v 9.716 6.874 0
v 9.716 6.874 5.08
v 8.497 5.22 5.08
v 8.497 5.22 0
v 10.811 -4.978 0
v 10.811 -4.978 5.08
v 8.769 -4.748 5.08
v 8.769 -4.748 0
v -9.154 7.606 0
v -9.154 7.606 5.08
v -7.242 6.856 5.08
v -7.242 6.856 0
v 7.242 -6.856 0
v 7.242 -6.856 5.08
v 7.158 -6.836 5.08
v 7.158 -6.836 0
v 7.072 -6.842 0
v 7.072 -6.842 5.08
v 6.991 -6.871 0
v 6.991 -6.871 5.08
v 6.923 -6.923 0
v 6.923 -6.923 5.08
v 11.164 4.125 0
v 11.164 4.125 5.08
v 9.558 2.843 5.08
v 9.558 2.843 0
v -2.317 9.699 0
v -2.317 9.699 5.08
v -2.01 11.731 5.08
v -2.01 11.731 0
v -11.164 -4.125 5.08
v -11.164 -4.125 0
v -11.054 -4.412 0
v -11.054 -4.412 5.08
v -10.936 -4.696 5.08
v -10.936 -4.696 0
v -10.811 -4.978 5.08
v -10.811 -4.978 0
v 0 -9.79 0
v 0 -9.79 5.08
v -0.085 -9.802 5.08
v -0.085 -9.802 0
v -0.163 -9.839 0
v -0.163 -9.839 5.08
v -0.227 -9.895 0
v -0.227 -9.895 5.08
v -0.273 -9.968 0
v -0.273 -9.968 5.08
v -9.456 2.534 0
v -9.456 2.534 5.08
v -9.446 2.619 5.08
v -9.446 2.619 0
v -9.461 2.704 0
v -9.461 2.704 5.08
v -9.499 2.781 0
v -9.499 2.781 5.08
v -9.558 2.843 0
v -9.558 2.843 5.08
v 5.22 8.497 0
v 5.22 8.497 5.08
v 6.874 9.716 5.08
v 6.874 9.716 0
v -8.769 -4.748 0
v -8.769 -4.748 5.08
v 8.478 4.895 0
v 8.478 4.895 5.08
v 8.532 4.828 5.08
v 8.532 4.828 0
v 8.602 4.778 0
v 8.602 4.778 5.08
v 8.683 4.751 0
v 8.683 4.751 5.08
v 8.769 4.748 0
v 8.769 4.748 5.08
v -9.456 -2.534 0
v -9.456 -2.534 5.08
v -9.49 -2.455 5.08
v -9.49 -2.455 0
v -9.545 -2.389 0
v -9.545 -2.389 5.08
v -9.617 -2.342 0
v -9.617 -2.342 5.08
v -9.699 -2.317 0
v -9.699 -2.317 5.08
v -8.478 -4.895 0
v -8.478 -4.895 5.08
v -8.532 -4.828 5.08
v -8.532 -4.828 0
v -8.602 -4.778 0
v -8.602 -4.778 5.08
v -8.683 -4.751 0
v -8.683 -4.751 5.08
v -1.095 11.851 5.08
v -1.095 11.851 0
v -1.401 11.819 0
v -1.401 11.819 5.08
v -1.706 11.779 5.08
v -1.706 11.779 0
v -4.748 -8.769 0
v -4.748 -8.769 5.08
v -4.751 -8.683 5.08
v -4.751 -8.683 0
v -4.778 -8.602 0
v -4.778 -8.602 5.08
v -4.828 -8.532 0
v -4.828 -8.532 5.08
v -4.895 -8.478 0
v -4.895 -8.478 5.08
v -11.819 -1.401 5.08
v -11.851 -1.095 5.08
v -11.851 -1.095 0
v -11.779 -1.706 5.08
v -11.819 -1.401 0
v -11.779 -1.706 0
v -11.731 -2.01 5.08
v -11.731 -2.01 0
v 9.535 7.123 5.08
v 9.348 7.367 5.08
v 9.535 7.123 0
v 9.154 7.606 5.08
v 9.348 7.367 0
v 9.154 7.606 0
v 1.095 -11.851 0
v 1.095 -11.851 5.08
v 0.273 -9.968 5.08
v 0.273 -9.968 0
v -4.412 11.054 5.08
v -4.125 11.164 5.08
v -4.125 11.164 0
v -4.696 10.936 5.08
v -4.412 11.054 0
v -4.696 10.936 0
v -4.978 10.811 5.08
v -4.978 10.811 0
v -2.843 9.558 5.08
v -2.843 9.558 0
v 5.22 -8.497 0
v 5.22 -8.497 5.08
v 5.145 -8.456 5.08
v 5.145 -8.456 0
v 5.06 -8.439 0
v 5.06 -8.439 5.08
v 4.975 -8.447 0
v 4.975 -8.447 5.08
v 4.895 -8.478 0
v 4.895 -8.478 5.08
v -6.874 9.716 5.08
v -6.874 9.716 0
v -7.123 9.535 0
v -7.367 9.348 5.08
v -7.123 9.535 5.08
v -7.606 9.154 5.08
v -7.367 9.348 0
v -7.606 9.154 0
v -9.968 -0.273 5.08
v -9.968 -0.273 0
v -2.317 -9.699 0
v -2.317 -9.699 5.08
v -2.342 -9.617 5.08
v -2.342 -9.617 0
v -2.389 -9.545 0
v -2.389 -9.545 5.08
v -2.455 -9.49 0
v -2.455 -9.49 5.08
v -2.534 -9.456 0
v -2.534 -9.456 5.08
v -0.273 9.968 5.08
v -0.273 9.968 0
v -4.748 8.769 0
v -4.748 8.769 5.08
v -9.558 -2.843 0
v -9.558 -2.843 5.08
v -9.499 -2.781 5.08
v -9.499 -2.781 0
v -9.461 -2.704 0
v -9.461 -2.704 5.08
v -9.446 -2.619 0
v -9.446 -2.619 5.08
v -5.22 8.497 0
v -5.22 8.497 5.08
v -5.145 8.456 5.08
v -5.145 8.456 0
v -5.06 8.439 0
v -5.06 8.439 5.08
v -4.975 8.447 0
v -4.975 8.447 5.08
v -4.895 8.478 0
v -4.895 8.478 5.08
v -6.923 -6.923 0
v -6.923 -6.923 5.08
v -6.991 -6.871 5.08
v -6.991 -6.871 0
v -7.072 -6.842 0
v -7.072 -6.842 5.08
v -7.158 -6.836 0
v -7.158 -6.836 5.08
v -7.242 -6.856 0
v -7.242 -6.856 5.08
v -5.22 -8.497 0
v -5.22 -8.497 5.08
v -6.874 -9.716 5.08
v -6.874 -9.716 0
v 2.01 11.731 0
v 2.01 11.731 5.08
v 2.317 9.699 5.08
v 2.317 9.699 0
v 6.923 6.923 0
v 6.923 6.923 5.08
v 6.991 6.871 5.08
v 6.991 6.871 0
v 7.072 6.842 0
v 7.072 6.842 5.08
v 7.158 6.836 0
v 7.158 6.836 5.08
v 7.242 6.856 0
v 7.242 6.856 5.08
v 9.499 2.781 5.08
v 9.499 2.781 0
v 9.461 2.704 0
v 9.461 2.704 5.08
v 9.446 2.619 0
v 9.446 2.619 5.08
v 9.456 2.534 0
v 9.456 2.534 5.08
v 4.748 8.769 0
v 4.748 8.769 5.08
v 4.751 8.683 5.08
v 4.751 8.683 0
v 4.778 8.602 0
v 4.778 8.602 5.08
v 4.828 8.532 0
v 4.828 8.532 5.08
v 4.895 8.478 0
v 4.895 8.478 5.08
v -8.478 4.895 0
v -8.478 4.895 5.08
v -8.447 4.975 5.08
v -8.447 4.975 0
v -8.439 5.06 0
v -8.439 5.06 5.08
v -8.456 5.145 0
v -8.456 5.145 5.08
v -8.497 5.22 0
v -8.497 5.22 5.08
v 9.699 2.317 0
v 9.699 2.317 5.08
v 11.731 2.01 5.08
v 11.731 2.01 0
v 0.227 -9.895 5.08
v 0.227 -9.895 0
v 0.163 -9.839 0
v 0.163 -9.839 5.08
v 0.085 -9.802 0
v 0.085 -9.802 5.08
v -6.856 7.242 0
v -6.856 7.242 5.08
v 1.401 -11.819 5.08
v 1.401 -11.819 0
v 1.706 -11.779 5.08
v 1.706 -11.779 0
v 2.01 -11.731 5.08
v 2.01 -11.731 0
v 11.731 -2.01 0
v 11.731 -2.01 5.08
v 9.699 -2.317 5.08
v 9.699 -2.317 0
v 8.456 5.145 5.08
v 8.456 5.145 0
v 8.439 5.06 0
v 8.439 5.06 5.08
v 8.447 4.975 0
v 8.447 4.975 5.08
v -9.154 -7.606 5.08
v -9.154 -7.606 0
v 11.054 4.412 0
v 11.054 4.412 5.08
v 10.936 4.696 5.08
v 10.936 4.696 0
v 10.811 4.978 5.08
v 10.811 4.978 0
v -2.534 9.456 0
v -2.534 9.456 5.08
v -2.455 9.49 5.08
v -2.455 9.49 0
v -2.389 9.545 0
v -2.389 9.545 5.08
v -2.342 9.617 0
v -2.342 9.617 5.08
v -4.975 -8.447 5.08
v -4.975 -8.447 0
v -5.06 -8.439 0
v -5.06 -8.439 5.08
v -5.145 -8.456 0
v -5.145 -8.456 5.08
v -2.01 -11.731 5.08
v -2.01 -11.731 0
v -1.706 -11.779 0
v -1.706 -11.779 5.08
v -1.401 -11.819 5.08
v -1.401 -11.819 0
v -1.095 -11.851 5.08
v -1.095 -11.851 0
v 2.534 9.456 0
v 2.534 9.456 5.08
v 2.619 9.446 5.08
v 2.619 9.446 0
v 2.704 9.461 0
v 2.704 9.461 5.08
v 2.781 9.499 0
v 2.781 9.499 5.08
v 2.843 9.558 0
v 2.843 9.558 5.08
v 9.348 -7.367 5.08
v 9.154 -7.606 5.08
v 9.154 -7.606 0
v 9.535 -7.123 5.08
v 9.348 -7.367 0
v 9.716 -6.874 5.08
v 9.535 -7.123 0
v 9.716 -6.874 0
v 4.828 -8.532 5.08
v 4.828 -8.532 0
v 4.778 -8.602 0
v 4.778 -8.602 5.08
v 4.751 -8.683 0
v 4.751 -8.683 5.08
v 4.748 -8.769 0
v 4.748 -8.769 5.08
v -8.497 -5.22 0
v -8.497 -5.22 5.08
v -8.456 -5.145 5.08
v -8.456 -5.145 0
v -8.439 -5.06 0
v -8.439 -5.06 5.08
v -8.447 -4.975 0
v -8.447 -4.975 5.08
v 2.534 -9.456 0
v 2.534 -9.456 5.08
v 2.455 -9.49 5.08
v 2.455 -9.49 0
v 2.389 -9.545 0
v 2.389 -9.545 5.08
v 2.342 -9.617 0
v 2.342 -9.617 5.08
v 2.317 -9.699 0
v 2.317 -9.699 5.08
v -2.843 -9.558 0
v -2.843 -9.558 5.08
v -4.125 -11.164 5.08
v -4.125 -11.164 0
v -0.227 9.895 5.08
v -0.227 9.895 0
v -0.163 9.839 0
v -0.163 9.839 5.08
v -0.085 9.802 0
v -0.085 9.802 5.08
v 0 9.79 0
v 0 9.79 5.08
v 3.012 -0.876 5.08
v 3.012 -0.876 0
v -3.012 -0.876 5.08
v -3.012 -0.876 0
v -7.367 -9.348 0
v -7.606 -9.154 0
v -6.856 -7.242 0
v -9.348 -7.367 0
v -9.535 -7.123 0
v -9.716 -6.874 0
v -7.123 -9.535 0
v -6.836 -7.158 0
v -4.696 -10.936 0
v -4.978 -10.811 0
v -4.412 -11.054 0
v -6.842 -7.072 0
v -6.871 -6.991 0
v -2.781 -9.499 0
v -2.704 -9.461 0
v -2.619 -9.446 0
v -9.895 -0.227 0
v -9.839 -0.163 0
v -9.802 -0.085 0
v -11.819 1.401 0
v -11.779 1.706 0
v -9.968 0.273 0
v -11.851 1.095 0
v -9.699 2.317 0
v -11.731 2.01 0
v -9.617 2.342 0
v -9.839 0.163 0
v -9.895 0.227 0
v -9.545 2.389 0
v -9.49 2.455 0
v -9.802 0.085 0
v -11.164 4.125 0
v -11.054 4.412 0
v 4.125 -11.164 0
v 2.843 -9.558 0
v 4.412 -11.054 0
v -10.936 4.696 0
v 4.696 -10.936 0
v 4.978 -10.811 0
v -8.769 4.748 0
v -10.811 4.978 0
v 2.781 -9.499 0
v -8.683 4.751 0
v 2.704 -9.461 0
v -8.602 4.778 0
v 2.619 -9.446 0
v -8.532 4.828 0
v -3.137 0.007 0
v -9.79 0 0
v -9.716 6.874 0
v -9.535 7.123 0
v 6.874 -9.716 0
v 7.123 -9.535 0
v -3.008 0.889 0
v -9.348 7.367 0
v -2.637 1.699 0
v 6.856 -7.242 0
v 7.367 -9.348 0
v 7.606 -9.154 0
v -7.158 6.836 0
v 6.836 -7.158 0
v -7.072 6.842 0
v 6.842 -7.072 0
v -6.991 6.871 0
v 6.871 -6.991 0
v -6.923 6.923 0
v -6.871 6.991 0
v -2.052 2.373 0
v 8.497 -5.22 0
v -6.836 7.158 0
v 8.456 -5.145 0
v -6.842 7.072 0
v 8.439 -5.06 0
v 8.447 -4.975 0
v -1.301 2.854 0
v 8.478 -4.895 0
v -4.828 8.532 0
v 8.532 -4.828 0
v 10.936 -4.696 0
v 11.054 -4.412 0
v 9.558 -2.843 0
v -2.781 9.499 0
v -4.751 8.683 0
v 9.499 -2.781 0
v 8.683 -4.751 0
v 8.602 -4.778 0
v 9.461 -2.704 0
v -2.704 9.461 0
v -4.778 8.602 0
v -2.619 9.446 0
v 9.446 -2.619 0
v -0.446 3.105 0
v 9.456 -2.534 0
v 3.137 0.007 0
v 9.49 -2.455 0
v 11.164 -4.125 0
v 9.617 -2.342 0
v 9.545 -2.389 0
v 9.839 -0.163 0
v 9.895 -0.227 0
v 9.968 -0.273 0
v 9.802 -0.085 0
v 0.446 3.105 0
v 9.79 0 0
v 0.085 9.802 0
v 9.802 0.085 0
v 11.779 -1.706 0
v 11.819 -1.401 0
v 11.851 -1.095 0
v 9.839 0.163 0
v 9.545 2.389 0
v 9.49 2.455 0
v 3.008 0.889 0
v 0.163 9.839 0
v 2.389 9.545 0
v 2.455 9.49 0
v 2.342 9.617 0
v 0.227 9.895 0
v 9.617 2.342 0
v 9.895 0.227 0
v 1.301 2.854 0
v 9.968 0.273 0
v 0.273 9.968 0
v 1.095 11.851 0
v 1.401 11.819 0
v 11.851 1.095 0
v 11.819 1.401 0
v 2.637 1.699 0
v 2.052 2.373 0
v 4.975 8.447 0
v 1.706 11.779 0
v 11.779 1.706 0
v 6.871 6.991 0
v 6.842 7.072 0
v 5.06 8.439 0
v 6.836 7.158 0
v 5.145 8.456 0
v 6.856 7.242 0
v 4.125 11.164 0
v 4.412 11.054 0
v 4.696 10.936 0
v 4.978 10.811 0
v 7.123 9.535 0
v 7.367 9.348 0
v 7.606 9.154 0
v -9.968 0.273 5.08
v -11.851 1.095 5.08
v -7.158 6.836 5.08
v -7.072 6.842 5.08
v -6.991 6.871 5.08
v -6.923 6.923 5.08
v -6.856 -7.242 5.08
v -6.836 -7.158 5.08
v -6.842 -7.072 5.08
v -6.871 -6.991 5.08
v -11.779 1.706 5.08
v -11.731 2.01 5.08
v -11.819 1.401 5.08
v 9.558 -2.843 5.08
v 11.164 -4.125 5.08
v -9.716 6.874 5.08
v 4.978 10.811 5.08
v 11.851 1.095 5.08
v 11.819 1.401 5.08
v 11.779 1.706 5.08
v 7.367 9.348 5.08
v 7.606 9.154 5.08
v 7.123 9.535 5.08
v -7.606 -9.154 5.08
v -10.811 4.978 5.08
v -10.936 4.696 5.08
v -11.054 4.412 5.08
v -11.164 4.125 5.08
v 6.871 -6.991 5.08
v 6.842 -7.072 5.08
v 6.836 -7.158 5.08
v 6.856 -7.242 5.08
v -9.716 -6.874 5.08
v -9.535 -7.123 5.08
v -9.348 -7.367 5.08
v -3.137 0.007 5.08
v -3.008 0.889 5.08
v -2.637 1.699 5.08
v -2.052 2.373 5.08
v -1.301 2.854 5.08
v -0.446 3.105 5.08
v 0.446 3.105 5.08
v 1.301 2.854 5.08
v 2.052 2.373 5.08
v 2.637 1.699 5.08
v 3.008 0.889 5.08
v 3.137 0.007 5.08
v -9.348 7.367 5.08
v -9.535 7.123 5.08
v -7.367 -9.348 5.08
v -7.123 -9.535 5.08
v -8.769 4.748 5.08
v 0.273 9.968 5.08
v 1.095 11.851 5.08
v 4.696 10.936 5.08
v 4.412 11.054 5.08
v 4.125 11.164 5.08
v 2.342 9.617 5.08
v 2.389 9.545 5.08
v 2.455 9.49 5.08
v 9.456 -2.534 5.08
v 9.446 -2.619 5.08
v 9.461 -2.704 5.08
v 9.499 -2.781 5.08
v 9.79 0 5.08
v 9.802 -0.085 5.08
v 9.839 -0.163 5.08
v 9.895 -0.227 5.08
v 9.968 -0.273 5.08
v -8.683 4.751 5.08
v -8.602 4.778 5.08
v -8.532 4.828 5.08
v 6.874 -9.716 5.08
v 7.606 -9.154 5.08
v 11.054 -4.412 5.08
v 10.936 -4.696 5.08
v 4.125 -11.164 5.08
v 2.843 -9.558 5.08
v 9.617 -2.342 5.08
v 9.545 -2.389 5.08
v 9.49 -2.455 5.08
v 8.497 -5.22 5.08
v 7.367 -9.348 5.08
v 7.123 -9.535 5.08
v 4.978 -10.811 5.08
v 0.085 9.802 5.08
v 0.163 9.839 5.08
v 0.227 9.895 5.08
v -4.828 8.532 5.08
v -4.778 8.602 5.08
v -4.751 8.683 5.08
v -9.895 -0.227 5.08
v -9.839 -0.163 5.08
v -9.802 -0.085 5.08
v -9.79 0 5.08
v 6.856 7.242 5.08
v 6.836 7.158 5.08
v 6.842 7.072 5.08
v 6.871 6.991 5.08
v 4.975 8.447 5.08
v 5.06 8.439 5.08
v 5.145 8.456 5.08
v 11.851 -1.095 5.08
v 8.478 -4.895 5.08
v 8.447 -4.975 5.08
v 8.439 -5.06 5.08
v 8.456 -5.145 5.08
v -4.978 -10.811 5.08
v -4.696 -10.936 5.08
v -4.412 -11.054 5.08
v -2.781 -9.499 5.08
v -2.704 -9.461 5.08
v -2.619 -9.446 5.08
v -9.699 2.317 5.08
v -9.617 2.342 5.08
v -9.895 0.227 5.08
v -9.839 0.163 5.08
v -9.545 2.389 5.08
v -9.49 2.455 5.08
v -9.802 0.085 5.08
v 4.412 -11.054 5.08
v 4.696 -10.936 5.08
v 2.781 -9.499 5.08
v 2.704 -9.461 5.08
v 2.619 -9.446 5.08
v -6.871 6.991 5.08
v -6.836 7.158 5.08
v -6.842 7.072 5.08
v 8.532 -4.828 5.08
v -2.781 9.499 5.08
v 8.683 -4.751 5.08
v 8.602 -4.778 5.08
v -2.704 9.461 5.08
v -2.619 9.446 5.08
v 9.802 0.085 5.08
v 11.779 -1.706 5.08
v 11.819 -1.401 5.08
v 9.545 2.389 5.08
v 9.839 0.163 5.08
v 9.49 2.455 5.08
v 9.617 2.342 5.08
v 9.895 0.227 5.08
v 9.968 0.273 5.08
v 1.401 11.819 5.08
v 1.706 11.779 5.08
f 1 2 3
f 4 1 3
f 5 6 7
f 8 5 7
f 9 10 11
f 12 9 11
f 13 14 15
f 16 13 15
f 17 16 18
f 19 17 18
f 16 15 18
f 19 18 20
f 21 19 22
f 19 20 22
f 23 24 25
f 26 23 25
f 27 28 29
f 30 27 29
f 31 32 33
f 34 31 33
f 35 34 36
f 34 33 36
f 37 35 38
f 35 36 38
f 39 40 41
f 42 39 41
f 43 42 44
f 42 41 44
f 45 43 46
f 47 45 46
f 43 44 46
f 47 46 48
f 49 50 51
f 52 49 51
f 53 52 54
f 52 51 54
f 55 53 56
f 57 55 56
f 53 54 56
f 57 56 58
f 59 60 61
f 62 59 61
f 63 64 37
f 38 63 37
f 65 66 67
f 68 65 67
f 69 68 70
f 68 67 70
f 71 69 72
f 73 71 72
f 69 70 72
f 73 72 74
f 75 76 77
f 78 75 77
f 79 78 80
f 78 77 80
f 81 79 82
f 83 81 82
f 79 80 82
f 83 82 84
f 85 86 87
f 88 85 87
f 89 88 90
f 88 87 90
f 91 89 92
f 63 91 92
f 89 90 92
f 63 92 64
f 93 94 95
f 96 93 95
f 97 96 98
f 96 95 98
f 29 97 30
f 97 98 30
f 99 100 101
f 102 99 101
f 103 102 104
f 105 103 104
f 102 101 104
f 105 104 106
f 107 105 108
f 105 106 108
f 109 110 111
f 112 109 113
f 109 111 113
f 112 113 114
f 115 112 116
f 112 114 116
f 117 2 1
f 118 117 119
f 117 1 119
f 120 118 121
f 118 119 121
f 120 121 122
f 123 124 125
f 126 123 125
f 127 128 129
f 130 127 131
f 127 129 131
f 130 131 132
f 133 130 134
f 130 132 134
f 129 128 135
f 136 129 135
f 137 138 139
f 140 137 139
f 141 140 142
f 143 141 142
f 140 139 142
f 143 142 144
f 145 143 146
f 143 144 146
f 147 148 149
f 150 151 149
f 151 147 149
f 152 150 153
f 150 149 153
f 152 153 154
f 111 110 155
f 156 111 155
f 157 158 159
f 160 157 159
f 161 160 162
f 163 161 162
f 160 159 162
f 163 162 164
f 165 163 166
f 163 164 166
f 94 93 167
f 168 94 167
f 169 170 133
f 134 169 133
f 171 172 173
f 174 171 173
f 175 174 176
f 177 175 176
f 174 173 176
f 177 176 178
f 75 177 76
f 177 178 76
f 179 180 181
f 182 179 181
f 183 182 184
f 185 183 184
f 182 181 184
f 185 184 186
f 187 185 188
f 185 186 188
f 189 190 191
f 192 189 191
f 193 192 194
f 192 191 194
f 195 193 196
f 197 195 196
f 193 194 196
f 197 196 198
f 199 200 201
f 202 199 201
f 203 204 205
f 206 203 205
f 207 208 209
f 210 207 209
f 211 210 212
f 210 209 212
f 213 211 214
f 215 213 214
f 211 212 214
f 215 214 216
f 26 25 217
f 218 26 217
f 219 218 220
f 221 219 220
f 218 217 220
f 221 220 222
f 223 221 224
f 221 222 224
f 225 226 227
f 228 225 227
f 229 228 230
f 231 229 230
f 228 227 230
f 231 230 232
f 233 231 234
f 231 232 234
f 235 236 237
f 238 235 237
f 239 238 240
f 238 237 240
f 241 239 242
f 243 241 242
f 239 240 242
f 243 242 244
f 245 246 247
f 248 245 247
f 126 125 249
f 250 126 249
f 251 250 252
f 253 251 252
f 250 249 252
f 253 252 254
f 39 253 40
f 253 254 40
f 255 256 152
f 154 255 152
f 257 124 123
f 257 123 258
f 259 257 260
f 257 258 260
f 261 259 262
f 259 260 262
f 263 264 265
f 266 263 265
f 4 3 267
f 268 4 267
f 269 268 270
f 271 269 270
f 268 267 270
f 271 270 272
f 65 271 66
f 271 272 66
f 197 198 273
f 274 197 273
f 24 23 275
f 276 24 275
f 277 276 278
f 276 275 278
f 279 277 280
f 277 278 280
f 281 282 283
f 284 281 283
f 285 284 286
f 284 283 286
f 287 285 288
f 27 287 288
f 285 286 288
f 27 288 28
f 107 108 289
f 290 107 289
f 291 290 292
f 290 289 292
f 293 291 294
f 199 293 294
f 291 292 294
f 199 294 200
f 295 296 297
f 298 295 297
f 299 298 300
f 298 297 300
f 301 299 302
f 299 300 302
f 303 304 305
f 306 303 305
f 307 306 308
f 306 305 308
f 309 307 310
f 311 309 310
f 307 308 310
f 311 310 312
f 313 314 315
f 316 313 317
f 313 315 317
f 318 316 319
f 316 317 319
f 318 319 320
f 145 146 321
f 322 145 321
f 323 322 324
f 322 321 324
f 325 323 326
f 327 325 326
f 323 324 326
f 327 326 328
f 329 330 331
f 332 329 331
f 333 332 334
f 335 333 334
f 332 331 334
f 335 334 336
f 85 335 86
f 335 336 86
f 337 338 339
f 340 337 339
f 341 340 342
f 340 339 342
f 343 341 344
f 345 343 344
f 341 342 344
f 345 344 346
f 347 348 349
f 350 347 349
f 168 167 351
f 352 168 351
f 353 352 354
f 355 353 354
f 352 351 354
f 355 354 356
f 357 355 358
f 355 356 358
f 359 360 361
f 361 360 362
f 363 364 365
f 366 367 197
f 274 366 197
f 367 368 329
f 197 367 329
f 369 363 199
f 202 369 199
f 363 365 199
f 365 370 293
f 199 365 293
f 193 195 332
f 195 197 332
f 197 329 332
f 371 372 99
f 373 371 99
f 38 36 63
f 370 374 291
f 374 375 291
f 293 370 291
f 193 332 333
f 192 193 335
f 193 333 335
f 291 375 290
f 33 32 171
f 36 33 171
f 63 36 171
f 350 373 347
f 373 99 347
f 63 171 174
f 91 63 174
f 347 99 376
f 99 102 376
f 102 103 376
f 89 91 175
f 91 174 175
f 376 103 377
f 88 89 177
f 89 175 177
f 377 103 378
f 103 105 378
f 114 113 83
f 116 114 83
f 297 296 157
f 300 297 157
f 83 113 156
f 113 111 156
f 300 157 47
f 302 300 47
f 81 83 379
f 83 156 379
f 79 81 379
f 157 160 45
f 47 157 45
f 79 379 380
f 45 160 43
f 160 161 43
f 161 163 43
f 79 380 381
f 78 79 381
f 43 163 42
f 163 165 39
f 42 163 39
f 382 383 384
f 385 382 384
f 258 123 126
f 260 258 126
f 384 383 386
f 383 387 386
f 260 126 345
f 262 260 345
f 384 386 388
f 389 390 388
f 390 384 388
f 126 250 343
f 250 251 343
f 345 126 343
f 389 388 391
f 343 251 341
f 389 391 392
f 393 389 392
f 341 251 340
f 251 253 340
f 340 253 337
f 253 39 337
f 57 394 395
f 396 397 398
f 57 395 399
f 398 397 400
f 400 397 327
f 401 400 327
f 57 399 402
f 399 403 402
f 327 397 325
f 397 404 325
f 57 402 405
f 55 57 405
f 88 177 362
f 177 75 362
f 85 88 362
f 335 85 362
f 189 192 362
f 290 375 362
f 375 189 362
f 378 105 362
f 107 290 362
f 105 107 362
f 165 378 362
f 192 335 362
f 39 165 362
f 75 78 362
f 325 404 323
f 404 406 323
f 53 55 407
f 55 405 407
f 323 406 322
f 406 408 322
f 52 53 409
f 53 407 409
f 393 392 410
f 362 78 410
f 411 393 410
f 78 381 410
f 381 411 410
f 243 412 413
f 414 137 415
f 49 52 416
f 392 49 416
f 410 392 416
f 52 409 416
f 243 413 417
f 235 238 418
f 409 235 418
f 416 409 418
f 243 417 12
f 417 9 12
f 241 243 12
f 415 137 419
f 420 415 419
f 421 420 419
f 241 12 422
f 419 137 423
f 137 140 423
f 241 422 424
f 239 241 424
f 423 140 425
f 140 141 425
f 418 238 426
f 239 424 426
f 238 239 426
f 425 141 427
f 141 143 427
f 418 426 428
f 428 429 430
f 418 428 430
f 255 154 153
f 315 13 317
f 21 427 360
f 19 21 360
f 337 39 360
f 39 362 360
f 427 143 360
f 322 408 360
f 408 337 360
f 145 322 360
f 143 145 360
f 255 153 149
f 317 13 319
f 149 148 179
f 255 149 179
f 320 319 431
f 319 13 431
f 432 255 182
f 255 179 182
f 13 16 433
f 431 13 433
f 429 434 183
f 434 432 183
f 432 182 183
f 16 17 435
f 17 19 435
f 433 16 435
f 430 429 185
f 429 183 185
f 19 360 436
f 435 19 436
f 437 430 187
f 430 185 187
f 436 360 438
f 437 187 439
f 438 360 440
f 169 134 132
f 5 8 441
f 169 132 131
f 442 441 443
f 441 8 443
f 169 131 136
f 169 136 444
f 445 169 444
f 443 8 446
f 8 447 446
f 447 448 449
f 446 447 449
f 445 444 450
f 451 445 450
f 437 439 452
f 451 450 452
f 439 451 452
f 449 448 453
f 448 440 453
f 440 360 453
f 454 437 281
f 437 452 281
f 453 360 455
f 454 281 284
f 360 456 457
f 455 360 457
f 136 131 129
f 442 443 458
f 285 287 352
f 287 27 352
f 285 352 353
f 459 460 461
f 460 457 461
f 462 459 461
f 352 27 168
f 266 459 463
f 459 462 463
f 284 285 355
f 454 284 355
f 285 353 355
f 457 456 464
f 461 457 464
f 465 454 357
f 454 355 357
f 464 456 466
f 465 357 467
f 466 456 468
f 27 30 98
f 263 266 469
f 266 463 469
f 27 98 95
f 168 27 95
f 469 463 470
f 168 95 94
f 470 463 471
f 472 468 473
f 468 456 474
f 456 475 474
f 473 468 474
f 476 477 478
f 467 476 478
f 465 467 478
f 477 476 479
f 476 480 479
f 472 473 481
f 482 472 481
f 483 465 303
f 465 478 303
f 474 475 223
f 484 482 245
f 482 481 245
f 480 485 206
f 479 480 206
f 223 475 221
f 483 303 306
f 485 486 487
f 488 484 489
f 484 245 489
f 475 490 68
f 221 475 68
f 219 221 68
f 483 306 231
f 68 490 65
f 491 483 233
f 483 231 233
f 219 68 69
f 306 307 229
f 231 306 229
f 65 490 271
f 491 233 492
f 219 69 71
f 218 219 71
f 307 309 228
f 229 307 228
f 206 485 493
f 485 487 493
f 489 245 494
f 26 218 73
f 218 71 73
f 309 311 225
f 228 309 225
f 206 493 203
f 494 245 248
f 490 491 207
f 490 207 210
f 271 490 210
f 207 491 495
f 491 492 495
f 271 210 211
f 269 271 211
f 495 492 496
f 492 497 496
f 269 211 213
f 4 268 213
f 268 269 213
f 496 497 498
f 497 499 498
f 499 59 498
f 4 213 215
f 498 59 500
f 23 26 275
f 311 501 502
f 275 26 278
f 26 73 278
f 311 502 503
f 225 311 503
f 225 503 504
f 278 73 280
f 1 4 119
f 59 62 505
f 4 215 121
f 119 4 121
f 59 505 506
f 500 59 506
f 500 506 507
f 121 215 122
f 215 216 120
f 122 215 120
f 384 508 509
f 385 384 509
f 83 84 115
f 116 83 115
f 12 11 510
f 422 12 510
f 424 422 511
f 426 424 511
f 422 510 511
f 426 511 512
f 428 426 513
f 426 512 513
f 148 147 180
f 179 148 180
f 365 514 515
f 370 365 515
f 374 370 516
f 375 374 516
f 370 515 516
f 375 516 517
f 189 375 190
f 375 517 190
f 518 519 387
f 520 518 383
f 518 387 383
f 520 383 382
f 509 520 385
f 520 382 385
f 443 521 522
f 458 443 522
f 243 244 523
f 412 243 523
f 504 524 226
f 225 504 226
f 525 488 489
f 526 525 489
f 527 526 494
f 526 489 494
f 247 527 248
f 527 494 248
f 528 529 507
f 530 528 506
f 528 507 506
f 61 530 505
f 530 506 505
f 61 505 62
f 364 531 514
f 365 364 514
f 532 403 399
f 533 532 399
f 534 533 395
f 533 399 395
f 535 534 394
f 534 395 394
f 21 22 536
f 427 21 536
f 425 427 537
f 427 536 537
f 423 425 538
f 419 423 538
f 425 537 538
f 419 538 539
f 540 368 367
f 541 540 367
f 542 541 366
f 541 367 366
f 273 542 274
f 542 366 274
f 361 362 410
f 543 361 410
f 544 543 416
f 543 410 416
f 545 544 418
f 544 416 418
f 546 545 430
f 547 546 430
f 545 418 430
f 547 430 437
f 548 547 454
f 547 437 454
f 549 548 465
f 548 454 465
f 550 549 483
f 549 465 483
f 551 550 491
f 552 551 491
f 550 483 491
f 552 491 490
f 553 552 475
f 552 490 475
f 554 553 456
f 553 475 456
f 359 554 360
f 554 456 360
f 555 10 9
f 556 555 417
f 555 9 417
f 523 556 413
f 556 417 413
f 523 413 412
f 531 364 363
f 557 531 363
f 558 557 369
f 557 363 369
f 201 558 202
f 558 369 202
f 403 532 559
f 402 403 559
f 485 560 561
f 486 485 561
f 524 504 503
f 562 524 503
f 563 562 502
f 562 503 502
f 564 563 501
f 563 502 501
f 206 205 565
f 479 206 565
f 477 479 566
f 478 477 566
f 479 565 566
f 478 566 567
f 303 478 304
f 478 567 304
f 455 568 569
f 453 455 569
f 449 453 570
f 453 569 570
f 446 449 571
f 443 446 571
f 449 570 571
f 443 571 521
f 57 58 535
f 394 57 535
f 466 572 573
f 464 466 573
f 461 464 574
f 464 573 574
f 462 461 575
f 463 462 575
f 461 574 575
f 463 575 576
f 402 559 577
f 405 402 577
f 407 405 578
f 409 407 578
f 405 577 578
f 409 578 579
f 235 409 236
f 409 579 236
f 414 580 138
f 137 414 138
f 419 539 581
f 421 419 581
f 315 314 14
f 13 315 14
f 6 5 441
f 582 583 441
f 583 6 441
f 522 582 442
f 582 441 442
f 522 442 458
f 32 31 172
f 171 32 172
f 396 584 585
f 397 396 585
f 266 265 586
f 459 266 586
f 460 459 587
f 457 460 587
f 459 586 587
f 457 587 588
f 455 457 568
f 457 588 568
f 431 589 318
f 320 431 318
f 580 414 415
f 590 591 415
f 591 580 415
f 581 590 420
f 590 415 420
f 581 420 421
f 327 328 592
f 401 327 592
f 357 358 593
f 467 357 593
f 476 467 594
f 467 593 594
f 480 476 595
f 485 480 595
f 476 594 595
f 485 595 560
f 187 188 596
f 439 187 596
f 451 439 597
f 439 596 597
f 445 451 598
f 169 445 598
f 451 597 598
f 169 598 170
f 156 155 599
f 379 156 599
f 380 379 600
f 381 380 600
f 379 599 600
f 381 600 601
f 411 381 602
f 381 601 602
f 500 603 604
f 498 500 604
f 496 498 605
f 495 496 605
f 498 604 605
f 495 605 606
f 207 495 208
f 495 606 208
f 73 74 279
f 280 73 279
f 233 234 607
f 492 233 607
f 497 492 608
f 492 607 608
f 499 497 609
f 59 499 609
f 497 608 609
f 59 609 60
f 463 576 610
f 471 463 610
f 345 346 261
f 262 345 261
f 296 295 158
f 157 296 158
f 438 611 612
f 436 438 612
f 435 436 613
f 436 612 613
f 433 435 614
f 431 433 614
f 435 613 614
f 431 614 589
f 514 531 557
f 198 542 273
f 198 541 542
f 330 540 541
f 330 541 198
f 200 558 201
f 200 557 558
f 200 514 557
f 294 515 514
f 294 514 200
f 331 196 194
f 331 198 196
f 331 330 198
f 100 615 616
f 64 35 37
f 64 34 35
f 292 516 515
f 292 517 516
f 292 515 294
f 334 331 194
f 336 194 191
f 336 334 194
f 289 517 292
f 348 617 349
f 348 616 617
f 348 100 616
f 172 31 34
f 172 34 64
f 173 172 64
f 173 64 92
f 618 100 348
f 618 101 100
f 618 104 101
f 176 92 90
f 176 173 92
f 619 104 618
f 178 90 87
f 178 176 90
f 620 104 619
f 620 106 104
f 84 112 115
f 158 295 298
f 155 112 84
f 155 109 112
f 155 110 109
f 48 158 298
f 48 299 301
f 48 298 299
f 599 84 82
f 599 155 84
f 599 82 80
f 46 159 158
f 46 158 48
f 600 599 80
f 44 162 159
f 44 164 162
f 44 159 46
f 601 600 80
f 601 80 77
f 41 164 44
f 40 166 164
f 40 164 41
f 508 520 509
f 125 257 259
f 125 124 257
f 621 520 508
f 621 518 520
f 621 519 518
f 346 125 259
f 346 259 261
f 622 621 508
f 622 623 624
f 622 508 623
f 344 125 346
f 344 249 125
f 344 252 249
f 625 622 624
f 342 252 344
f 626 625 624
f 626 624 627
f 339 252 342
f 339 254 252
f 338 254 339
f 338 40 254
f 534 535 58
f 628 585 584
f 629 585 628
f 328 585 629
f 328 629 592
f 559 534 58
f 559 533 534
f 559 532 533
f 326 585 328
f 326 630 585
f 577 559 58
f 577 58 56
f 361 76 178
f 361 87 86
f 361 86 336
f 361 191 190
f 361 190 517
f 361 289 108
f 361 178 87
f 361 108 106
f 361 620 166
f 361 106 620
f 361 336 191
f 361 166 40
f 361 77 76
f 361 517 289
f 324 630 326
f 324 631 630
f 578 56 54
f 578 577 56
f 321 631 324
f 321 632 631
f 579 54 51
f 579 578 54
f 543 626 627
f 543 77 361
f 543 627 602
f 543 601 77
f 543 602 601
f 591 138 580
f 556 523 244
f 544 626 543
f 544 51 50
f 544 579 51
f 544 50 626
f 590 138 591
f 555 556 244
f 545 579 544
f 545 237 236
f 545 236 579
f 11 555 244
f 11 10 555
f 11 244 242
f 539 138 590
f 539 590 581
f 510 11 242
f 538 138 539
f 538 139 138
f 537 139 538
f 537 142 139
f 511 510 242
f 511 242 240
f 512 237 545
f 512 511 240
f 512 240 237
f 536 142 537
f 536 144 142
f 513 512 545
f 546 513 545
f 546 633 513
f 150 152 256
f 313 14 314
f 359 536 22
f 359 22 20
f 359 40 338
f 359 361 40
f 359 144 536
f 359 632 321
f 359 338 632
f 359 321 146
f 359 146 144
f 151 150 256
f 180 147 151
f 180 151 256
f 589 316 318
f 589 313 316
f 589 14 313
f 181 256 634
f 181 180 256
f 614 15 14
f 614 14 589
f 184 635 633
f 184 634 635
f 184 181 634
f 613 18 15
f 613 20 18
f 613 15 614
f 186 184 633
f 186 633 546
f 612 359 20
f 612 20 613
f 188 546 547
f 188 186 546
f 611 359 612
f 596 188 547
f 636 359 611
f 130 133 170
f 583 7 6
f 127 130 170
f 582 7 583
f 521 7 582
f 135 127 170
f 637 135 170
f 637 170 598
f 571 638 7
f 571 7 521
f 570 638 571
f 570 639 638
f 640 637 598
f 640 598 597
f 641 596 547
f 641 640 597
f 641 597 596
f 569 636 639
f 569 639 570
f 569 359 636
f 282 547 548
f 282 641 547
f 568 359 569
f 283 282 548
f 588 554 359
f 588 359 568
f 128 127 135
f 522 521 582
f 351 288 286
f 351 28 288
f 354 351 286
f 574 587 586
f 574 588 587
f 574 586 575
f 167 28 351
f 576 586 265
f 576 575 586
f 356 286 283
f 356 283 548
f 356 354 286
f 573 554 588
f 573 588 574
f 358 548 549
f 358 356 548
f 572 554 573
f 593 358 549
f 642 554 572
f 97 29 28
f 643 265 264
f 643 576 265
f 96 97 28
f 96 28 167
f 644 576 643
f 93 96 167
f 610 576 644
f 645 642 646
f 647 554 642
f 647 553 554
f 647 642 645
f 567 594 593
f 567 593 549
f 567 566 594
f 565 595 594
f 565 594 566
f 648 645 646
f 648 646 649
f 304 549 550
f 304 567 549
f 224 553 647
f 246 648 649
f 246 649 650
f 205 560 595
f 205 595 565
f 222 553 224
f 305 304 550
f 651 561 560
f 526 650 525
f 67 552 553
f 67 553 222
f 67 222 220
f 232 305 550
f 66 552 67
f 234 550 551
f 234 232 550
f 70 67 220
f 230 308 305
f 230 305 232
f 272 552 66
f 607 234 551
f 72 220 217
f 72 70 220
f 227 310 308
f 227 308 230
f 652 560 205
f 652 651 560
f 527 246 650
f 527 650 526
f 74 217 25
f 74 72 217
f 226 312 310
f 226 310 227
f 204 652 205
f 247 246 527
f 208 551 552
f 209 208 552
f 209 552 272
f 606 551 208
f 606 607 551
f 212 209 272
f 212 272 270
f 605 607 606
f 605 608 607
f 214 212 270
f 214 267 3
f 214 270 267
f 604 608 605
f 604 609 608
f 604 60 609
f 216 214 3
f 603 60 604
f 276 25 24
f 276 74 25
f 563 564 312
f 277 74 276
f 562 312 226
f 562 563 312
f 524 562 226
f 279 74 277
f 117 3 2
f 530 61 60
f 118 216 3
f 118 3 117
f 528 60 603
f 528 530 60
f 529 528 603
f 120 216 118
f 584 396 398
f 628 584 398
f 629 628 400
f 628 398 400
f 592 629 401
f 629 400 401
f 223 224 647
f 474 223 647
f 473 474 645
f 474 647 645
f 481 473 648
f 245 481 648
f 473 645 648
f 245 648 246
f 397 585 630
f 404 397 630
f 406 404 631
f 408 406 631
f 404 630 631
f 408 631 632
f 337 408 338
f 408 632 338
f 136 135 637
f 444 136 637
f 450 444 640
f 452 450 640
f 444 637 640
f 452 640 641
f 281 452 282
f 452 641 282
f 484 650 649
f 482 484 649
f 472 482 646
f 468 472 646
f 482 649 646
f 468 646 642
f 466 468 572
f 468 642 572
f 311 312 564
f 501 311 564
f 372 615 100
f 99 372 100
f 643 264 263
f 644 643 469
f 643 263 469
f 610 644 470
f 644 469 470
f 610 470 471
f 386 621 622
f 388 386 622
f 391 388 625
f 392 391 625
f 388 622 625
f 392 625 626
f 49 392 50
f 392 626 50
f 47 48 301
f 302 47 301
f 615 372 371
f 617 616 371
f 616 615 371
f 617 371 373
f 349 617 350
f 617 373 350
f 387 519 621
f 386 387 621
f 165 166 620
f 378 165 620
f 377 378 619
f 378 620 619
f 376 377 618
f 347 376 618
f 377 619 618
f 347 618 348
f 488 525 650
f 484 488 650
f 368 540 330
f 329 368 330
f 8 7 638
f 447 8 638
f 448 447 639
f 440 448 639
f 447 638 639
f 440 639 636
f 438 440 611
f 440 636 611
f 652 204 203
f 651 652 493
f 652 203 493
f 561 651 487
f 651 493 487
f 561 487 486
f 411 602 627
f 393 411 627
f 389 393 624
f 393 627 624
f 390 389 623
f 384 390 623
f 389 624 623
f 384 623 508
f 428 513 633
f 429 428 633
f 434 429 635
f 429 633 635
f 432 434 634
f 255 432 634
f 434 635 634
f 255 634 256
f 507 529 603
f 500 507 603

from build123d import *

# Parameters (mm, degrees)
F0_R     = 11.9016009371
F1_DEPTH = 5.08
F3_DEPTH = 5.08
F4_COUNT = 24
F4_ANGLE = 345


with BuildPart() as f1:
    # F0 (on Top) → F1 (new body)
    with BuildSketch(Plane.XY):
        Circle(F0_R)
        with BuildLine():
            ThreePointArc((-3.0120209, -0.8762828927), (0, 3.1369), (3.0120209, -0.8762828927))
            Line((3.0120209, -0.8762828927), (-3.0120209, -0.8762828927))
        make_face(mode=Mode.SUBTRACT)
    extrude(amount=F1_DEPTH)

    # F2 (on face) → F3 (cut, through all)
    with BuildSketch(Plane.XY.offset(5.08)):
        with BuildLine():
            ThreePointArc((-0.272684092, 9.968449005), (-0.1629528148, 9.8385506215), (0, 9.7899612874))
            Line((0, 9.7899612874), (0, 11.9016009371))
            ThreePointArc((0, 11.9016009371), (-0.5479117768, 11.8889821916), (-1.0946616999, 11.8511527131))
            Line((-1.0946616999, 11.8511527131), (-0.272684092, 9.968449005))
        make_face()
        with BuildLine():
            Line((0, 11.9016009371), (0, 9.7899612874))
            ThreePointArc((0, 9.7899612874), (0.1629528148, 9.8385506215), (0.272684092, 9.968449005))
            Line((0.272684092, 9.968449005), (1.0946616999, 11.8511527131))
            ThreePointArc((1.0946616999, 11.8511527131), (0.5479117768, 11.8889821916), (0, 11.9016009371))
        make_face()
    f3 = extrude(amount=-F3_DEPTH, mode=Mode.SUBTRACT)

    # F4: F3 ×24 about axis
    f4_axis = Axis((0, 0, 0), (0, 0, -1))
    for i in range(1, F4_COUNT):
        add(f3.rotate(f4_axis, i * F4_ANGLE / (F4_COUNT - 1)), mode=Mode.SUBTRACT)


solid = f1.part
